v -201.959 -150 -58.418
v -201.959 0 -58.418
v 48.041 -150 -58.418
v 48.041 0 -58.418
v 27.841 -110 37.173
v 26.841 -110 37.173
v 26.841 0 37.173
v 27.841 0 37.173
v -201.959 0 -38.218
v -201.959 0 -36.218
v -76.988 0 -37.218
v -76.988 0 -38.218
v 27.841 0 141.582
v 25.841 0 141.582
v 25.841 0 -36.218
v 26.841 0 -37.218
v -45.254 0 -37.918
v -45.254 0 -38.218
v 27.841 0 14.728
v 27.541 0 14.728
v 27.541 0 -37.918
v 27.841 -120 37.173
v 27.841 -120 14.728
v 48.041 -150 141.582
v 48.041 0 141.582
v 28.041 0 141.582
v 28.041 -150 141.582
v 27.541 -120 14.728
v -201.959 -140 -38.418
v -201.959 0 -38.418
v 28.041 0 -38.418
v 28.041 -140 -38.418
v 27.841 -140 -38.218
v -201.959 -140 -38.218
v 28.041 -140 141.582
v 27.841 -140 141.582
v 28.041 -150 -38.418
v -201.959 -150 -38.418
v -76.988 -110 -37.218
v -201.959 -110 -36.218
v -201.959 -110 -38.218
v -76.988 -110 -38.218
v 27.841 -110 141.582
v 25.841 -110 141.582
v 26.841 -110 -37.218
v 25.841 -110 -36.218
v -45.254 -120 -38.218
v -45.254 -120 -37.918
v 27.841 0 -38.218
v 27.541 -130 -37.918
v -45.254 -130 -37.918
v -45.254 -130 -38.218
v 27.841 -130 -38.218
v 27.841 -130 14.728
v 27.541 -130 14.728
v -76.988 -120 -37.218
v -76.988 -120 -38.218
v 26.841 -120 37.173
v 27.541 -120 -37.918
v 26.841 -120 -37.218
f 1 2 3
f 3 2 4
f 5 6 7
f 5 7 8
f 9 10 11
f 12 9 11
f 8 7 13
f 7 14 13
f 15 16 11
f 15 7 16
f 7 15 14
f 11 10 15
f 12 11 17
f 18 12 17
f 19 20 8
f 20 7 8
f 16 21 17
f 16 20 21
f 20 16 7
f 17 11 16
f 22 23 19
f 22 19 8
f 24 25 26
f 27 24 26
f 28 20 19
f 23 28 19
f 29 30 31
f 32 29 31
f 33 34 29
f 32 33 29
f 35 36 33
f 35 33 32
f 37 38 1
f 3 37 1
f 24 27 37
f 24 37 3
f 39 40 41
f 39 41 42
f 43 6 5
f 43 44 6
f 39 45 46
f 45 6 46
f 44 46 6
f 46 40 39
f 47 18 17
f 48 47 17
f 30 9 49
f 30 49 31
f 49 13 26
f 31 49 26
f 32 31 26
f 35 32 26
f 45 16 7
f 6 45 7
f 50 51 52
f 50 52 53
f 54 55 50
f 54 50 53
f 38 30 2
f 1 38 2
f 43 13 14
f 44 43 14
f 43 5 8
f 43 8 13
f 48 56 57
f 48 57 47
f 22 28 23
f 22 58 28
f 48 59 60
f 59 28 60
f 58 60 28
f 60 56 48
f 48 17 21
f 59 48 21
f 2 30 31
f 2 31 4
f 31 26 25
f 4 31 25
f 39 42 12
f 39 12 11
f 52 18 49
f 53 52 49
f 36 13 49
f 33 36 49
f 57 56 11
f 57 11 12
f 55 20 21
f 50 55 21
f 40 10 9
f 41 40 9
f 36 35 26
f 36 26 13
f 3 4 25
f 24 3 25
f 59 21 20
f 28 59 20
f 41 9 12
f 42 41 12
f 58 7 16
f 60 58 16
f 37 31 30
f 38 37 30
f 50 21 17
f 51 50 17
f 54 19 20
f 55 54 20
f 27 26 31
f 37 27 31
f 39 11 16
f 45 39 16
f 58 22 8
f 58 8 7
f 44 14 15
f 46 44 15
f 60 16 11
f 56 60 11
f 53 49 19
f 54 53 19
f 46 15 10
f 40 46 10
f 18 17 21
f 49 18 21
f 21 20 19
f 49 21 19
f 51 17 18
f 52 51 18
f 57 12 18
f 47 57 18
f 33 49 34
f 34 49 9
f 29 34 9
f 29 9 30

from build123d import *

# Parameters (mm, degrees)
F1_DEPTH = 150
F2_DEPTH = 140
F3_DEPTH = 130
F4_DEPTH = 120
F5_DEPTH = 110


with BuildPart() as f1:
    # F0 (on Front) → F1 (new body)
    with BuildSketch(Plane.XZ):
        Polygon((28.041143, -38.418245), (-201.958857, -38.418245), (-201.958857, -58.418245), (48.041143, -58.418245), (48.041143, 141.581755), (28.041143, 141.581755), align=None)
    extrude(amount=F1_DEPTH)


with BuildPart() as f2:
    # F0 (on Front) → F2 (new body)
    with BuildSketch(Plane.XZ):
        Polygon((-201.958857, -38.218245), (-201.958857, -38.418245), (28.041143, -38.418245), (28.041143, 141.581755), (27.841143, 141.581755), (27.841143, 37.173405), (27.841143, 14.727511), (27.841143, -38.218245), (-45.25356, -38.218245), (-76.987758, -38.218245), align=None)
    extrude(amount=F2_DEPTH)


with BuildPart() as f3:
    # F0 (on Front) → F3 (new body)
    with BuildSketch(Plane.XZ):
        Polygon((-45.25356, -37.918245), (-45.25356, -38.218245), (27.841143, -38.218245), (27.841143, 14.727511), (27.541143, 14.727511), (27.541143, -37.918245), align=None)
    extrude(amount=F3_DEPTH)


with BuildPart() as f4:
    # F0 (on Front) → F4 (new body)
    with BuildSketch(Plane.XZ):
        Polygon((-76.987758, -37.218245), (-76.987758, -38.218245), (-45.25356, -38.218245), (-45.25356, -37.918245), (27.541143, -37.918245), (27.541143, 14.727511), (27.841143, 14.727511), (27.841143, 37.173405), (26.841143, 37.173405), (26.841143, -37.218245), align=None)
    extrude(amount=F4_DEPTH)


with BuildPart() as f5:
    # F0 (on Front) → F5 (new body)
    with BuildSketch(Plane.XZ):
        Polygon((-201.958857, -36.218245), (-201.958857, -38.218245), (-76.987758, -38.218245), (-76.987758, -37.218245), (26.841143, -37.218245), (26.841143, 37.173405), (27.841143, 37.173405), (27.841143, 141.581755), (25.841143, 141.581755), (25.841143, -36.218245), align=None)
    extrude(amount=F5_DEPTH)


solid = Compound([f1.part, f2.part, f3.part, f4.part, f5.part])
